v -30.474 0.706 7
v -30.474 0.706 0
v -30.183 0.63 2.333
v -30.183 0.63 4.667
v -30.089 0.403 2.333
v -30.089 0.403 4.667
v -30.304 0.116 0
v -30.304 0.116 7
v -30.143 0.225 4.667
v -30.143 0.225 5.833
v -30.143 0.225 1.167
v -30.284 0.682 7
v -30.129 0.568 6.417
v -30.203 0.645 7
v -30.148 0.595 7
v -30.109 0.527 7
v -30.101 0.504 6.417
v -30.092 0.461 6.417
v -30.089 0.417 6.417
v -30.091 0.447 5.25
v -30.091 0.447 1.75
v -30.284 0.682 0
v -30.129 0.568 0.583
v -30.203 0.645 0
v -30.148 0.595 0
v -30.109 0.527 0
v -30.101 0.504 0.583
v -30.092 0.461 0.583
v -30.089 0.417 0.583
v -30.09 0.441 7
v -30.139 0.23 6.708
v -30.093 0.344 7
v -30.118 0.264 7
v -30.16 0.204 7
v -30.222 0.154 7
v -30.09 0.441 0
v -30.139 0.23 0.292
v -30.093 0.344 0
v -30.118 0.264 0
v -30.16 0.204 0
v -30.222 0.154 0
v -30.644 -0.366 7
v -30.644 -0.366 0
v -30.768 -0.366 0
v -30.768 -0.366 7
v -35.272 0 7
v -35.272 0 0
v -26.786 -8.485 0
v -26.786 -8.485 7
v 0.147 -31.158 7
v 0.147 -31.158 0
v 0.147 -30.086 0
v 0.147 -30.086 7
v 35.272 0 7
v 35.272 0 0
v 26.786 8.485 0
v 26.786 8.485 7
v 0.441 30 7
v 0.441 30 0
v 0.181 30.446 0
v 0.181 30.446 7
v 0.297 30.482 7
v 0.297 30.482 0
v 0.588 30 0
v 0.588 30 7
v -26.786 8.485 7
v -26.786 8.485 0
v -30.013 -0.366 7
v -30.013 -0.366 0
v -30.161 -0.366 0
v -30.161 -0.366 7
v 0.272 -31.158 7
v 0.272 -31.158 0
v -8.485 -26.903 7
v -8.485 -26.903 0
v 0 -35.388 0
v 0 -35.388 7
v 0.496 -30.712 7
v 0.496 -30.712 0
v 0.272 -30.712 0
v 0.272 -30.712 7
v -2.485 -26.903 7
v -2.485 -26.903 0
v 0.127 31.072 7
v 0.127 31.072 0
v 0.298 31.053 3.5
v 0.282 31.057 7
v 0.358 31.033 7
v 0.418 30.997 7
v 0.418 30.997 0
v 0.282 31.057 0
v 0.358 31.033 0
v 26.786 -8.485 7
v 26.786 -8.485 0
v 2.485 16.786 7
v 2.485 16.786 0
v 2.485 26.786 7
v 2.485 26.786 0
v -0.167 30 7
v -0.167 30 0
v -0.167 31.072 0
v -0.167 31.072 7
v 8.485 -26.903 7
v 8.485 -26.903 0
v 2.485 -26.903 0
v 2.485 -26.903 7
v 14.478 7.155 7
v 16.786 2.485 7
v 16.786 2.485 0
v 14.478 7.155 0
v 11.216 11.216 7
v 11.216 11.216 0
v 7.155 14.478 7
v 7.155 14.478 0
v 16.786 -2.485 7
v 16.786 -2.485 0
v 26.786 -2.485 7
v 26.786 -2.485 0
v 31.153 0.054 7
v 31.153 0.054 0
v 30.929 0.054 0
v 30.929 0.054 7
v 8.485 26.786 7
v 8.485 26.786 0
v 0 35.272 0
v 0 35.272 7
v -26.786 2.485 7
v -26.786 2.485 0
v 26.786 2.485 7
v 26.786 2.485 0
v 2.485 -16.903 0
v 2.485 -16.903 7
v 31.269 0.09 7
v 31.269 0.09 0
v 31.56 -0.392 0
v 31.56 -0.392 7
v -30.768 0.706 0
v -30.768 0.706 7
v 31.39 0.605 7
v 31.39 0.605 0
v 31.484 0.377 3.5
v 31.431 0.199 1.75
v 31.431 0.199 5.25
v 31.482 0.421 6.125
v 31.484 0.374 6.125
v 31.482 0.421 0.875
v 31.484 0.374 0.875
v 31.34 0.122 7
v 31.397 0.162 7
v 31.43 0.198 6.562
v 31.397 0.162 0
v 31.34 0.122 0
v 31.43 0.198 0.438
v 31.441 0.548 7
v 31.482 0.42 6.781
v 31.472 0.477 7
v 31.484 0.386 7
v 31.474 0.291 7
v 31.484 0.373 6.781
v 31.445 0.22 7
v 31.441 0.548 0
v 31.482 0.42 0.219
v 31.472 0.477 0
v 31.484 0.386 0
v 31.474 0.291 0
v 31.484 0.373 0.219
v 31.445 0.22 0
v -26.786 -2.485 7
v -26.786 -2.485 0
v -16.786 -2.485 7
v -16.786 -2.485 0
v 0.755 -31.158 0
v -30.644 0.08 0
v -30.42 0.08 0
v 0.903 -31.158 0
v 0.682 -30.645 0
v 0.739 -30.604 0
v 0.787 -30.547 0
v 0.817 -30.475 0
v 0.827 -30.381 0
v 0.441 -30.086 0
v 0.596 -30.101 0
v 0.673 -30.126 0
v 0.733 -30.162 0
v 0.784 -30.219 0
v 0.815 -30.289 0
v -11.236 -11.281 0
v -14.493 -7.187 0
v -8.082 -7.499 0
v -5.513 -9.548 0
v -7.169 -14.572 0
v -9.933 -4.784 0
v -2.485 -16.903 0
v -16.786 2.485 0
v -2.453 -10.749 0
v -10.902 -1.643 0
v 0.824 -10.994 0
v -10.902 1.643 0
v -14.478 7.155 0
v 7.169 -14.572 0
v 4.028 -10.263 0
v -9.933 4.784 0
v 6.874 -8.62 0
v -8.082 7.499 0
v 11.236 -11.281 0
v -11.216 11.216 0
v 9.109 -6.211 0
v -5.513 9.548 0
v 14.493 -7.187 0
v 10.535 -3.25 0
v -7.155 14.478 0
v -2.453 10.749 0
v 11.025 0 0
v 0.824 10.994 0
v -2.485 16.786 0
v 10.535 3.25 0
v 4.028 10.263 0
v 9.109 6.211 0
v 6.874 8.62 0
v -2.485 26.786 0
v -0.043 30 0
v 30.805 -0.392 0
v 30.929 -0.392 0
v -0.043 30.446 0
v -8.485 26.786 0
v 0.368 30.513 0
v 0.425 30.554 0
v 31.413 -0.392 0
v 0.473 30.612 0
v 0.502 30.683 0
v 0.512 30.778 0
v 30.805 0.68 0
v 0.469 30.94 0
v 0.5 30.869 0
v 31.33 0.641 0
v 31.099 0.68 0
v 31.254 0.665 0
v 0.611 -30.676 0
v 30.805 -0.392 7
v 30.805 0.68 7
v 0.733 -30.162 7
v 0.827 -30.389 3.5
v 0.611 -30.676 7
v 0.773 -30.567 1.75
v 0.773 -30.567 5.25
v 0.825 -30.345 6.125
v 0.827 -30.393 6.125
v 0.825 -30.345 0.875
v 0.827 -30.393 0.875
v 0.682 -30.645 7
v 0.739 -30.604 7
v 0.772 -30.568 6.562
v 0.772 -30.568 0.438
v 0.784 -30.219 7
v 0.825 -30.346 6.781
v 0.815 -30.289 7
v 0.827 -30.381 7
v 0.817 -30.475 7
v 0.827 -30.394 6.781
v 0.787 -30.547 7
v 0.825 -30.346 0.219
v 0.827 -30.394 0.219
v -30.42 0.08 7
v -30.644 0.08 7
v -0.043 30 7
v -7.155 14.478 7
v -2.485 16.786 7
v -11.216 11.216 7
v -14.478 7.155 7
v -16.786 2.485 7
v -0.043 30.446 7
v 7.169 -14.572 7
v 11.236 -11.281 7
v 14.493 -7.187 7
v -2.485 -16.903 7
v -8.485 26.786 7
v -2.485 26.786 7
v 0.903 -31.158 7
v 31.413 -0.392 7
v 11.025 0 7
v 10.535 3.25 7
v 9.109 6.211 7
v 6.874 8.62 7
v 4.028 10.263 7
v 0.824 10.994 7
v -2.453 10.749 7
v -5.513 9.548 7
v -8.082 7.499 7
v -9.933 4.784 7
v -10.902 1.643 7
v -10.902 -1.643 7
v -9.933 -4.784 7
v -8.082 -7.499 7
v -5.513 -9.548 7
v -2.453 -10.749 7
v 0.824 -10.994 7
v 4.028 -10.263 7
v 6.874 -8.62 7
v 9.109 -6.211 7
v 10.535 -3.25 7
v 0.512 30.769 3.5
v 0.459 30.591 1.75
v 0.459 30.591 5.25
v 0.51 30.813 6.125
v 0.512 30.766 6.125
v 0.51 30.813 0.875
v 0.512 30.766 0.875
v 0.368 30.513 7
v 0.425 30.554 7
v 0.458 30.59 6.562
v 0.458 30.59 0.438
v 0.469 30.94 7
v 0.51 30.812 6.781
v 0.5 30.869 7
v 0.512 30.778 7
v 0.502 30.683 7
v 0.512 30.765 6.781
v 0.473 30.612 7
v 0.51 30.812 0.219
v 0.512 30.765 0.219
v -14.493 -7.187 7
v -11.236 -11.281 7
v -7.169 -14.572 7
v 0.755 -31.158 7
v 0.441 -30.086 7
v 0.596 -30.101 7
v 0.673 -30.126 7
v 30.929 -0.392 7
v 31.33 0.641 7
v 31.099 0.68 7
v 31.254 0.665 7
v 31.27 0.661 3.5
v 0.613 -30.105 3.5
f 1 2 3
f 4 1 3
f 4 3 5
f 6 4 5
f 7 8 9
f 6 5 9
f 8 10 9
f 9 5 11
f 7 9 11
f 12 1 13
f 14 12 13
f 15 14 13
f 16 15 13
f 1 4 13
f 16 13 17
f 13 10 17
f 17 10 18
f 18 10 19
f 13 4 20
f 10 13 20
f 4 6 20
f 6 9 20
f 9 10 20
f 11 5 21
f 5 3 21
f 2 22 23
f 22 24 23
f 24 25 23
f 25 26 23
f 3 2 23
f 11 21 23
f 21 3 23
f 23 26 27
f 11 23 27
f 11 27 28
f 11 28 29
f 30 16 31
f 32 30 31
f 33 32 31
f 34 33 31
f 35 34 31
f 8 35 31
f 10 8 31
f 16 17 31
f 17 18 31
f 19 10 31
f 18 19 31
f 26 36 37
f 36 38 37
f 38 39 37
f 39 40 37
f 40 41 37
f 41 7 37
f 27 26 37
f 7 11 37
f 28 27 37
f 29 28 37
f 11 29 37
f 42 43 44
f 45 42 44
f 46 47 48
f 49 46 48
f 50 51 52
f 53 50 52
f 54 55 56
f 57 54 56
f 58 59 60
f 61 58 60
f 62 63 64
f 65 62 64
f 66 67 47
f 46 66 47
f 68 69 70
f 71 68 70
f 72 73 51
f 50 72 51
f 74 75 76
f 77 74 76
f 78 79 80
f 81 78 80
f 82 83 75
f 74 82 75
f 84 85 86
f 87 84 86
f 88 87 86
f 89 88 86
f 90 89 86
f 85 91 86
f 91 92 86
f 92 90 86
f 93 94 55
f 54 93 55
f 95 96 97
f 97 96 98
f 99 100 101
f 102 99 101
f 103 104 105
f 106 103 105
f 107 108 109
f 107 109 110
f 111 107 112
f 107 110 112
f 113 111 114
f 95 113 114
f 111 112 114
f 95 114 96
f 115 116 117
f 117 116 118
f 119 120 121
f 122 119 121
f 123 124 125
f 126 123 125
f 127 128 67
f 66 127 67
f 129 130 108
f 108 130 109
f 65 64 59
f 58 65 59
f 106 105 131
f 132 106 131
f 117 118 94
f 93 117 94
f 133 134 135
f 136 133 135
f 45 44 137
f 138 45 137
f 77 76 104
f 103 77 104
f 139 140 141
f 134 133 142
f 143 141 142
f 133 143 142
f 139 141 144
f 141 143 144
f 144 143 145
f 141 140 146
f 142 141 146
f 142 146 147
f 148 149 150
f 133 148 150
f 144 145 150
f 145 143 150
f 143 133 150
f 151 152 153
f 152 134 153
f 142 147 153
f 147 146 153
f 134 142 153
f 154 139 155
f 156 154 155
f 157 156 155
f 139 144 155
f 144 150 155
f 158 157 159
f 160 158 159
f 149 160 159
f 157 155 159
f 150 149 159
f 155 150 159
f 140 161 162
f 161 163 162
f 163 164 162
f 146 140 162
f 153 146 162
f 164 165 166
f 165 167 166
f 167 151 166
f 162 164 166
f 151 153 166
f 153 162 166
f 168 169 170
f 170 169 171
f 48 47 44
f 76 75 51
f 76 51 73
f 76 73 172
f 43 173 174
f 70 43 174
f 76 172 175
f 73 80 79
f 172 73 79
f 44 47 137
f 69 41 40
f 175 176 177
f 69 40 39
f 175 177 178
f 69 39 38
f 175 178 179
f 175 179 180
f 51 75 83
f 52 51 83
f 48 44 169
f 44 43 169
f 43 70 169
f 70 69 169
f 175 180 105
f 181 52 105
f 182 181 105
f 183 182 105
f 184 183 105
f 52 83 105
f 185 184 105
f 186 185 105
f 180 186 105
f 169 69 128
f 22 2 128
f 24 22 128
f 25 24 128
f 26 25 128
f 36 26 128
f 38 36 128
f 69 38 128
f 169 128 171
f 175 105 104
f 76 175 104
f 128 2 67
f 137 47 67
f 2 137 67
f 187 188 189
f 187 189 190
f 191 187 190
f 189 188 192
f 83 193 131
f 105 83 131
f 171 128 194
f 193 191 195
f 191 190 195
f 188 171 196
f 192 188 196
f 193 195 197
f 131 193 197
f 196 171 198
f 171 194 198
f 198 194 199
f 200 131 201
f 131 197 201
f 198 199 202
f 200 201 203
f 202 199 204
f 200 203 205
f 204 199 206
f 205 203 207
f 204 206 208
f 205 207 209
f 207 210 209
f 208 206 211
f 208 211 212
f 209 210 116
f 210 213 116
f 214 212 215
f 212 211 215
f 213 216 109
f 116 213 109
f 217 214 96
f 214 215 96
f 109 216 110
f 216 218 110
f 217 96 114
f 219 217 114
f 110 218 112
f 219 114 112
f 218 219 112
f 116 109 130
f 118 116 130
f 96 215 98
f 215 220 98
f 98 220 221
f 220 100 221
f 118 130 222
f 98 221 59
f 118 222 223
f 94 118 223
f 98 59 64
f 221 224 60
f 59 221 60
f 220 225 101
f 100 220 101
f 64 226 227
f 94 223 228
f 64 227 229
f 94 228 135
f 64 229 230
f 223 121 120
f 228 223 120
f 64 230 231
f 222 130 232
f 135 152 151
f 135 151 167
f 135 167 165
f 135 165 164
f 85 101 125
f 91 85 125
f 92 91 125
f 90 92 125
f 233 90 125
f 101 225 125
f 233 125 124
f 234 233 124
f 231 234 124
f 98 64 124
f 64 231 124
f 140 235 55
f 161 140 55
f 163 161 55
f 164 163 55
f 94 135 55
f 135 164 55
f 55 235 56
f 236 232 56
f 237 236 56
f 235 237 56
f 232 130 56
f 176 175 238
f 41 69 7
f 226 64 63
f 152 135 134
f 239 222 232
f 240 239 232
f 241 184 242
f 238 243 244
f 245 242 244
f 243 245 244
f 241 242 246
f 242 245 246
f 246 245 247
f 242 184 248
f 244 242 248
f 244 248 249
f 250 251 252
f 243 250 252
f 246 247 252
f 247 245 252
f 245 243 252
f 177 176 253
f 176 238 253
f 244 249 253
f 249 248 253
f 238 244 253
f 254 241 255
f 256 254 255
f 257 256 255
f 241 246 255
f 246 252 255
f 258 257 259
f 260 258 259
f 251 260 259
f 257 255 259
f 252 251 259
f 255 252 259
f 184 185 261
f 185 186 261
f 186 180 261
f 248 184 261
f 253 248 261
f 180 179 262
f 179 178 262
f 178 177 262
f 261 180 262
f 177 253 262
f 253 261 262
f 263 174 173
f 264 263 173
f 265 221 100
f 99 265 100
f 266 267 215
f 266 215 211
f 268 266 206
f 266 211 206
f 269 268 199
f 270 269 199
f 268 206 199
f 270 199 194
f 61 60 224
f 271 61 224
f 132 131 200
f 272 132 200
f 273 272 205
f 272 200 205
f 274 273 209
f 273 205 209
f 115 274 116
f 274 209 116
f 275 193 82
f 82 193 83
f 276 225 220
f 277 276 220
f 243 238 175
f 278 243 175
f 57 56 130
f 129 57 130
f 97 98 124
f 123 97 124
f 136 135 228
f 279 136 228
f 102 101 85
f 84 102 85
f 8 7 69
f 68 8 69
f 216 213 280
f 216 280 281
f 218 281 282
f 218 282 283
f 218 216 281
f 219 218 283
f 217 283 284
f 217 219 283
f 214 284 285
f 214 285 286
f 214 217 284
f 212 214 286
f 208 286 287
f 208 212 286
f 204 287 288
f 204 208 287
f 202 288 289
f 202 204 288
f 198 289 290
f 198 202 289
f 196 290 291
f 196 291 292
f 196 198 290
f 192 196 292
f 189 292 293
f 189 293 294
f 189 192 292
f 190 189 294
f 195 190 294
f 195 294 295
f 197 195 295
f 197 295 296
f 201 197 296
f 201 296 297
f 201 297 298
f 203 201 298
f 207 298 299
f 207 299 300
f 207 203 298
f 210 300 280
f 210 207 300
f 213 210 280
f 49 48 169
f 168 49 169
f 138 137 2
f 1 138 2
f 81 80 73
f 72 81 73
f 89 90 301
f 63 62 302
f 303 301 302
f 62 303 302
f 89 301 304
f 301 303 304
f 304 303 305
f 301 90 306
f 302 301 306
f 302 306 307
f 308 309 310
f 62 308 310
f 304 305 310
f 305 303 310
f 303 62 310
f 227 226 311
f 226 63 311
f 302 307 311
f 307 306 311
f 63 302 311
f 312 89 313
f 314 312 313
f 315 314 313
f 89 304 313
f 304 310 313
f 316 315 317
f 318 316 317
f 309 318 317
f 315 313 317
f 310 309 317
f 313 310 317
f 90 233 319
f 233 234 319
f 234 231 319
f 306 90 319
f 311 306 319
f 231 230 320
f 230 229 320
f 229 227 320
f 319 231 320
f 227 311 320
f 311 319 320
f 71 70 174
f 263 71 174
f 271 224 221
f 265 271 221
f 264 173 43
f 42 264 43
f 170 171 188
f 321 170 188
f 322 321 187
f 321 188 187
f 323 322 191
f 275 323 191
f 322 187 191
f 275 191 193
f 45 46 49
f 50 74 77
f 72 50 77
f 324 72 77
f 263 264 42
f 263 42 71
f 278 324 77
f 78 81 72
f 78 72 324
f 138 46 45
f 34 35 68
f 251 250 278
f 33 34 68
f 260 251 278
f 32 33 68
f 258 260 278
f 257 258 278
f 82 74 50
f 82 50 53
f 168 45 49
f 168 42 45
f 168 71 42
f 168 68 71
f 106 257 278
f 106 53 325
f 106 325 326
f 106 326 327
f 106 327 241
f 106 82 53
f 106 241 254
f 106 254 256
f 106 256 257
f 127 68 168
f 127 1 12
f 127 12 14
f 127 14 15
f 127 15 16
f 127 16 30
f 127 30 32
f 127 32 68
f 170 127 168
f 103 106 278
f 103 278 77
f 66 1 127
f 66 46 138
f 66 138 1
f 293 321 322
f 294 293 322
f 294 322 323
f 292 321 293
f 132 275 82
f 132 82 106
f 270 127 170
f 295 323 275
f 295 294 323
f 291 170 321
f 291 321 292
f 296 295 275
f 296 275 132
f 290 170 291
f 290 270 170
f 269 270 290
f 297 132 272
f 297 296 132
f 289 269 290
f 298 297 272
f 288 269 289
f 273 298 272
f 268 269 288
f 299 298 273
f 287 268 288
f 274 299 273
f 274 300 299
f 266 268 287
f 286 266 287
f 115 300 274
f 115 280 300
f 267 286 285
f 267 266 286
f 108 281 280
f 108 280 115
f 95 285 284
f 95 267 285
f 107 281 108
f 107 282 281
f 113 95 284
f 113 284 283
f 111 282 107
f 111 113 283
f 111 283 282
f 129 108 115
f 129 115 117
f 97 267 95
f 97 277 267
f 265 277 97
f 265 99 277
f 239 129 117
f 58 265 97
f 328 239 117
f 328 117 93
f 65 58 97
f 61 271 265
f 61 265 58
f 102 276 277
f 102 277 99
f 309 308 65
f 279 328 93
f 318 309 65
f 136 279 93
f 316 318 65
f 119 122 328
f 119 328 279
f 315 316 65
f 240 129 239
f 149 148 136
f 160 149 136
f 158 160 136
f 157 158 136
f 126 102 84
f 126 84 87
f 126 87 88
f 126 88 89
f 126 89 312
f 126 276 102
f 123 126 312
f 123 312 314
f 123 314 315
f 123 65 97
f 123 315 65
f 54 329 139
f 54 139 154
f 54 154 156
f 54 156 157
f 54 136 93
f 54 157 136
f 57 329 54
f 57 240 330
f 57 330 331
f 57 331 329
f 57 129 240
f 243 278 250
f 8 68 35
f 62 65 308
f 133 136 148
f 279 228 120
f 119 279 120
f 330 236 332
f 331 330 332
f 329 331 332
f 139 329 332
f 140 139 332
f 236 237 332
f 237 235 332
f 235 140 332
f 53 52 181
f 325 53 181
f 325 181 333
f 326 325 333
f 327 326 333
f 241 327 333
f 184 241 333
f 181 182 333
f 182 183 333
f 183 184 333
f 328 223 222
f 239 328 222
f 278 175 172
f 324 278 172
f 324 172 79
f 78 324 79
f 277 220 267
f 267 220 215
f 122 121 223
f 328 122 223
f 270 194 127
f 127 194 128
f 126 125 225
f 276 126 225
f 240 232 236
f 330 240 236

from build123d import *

# Parameters (mm, degrees)
F0_R     = 11.025
F1_DEPTH = 7


with BuildPart() as f1:
    # F0 (on Top) → F1 (new body)
    with BuildSketch(Plane.XY):
        with BuildLine():
            Line((8.4852813742, 26.7863036134), (0, 35.2715849876))
            Line((0, 35.2715849876), (-8.4852813742, 26.7863036134))
            Line((-8.4852813742, 26.7863036134), (-2.4852813742, 26.7863036134))
            Line((-2.4852813742, 26.7863036134), (-2.4852813742, 16.7863036134))
            ThreePointArc((-2.4852813742, 16.7863036134), (-11.2157675105, 11.2157675105), (-16.7863036134, 2.4852813742))
            Line((-16.7863036134, 2.4852813742), (-26.7863036134, 2.4852813742))
            Line((-26.7863036134, 2.4852813742), (-26.7863036134, 8.4852813742))
            Line((-26.7863036134, 8.4852813742), (-35.2715849876, 0))
            Line((-35.2715849876, 0), (-26.7863036134, -8.4852813742))
            Line((-26.7863036134, -8.4852813742), (-26.7863036134, -2.4852813742))
            Line((-26.7863036134, -2.4852813742), (-16.7863036134, -2.4852813742))
            ThreePointArc((-16.7863036134, -2.4852813742), (-11.2357756094, -11.2810159865), (-2.4852813742, -16.9025957584))
            Line((-2.4852813742, -16.9025957584), (-2.4852813742, -26.9025957584))
            Line((-2.4852813742, -26.9025957584), (-8.4852813742, -26.9025957584))
            Line((-8.4852813742, -26.9025957584), (0, -35.3878771327))
            Line((0, -35.3878771327), (8.4852813742, -26.9025957584))
            Line((8.4852813742, -26.9025957584), (2.4852813742, -26.9025957584))
            Line((2.4852813742, -26.9025957584), (2.4852813742, -16.9025957584))
            ThreePointArc((2.4852813742, -16.9025957584), (11.2357756094, -11.2810159865), (16.7863036134, -2.4852813742))
            Line((16.7863036134, -2.4852813742), (26.7863036134, -2.4852813742))
            Line((26.7863036134, -2.4852813742), (26.7863036134, -8.4852813742))
            Line((26.7863036134, -8.4852813742), (35.2715849876, 0))
            Line((35.2715849876, 0), (26.7863036134, 8.4852813742))
            Line((26.7863036134, 8.4852813742), (26.7863036134, 2.4852813742))
            Line((26.7863036134, 2.4852813742), (16.7863036134, 2.4852813742))
            ThreePointArc((16.7863036134, 2.4852813742), (11.2157675105, 11.2157675105), (2.4852813742, 16.7863036134))
            Line((2.4852813742, 16.7863036134), (2.4852813742, 26.7863036134))
            Line((2.4852813742, 26.7863036134), (8.4852813742, 26.7863036134))
        make_face()
        with BuildLine():
            Line((0.4957766307, -30.7123869197), (0.2719380573, -30.7123869197))
            Line((0.2719380573, -30.7123869197), (0.2719380573, -31.1581870135))
            Line((0.2719380573, -31.1581870135), (0.1473486626, -31.1581870135))
            Line((0.1473486626, -31.1581870135), (0.1473486626, -30.0861551036))
            Line((0.1473486626, -30.0861551036), (0.4413420929, -30.0861551036))
            add(Edge.make_bspline(
                [(0.4413420929, -30.0861551036), (0.6386672924, -30.0861551036), (0.7328718911, -30.161706488)],
                knots=[0, 0, 0, 1, 1, 1], degree=2))
            add(Edge.make_bspline(
                [(0.7328718911, -30.161706488), (0.8270764899, -30.2372578723), (0.8270764899, -30.3890645358)],
                knots=[0, 0, 0, 1, 1, 1], degree=2))
            add(Edge.make_bspline(
                [(0.8270764899, -30.3890645358), (0.8270764899, -30.6016407911), (0.6114500235, -30.6764882805)],
                knots=[0, 0, 0, 1, 1, 1], degree=2))
            Line((0.6114500235, -30.6764882805), (0.9026278742, -31.1581870135))
            Line((0.9026278742, -31.1581870135), (0.7552792116, -31.1581870135))
            Line((0.7552792116, -31.1581870135), (0.4957766307, -30.7123869197))
        make_face(mode=Mode.SUBTRACT)
        with BuildLine():
            Line((-30.4200164008, 0.0797443089), (-30.6438549742, 0.0797443089))
            Line((-30.6438549742, 0.0797443089), (-30.6438549742, -0.366055785))
            Line((-30.6438549742, -0.366055785), (-30.7684443689, -0.366055785))
            Line((-30.7684443689, -0.366055785), (-30.7684443689, 0.7059761249))
            Line((-30.7684443689, 0.7059761249), (-30.4744509385, 0.7059761249))
            add(Edge.make_bspline(
                [(-30.4744509385, 0.7059761249), (-30.2771257391, 0.7059761249), (-30.1829211403, 0.6304247406)],
                knots=[0, 0, 0, 1, 1, 1], degree=2))
            add(Edge.make_bspline(
                [(-30.1829211403, 0.6304247406), (-30.0887165415, 0.5548733563), (-30.0887165415, 0.4030666927)],
                knots=[0, 0, 0, 1, 1, 1], degree=2))
            add(Edge.make_bspline(
                [(-30.0887165415, 0.4030666927), (-30.0887165415, 0.1904904375), (-30.304343008, 0.115642948)],
                knots=[0, 0, 0, 1, 1, 1], degree=2))
            Line((-30.304343008, 0.115642948), (-30.0131651572, -0.366055785))
            Line((-30.0131651572, -0.366055785), (-30.1605138198, -0.366055785))
            Line((-30.1605138198, -0.366055785), (-30.4200164008, 0.0797443089))
        make_face(mode=Mode.SUBTRACT)
        Circle(F0_R, mode=Mode.SUBTRACT)
        with BuildLine():
            Line((31.1531984282, 0.0540223872), (30.9293598548, 0.0540223872))
            Line((30.9293598548, 0.0540223872), (30.9293598548, -0.3917777067))
            Line((30.9293598548, -0.3917777067), (30.8047704601, -0.3917777067))
            Line((30.8047704601, -0.3917777067), (30.8047704601, 0.6802542032))
            Line((30.8047704601, 0.6802542032), (31.0987638904, 0.6802542032))
            add(Edge.make_bspline(
                [(31.0987638904, 0.6802542032), (31.2960890899, 0.6802542032), (31.3902936886, 0.6047028189)],
                knots=[0, 0, 0, 1, 1, 1], degree=2))
            add(Edge.make_bspline(
                [(31.3902936886, 0.6047028189), (31.4844982874, 0.5291514346), (31.4844982874, 0.377344771)],
                knots=[0, 0, 0, 1, 1, 1], degree=2))
            add(Edge.make_bspline(
                [(31.4844982874, 0.377344771), (31.4844982874, 0.1647685158), (31.268871821, 0.0899210263)],
                knots=[0, 0, 0, 1, 1, 1], degree=2))
            Line((31.268871821, 0.0899210263), (31.5600496718, -0.3917777067))
            Line((31.5600496718, -0.3917777067), (31.4127010092, -0.3917777067))
            Line((31.4127010092, -0.3917777067), (31.1531984282, 0.0540223872))
        make_face(mode=Mode.SUBTRACT)
        with BuildLine():
            Line((0.1811846398, 30.4459987263), (-0.0426539337, 30.4459987263))
            Line((-0.0426539337, 30.4459987263), (-0.0426539337, 30.0001986325))
            Line((-0.0426539337, 30.0001986325), (-0.1672433283, 30.0001986325))
            Line((-0.1672433283, 30.0001986325), (-0.1672433283, 31.0722305424))
            Line((-0.1672433283, 31.0722305424), (0.126750102, 31.0722305424))
            add(Edge.make_bspline(
                [(0.126750102, 31.0722305424), (0.3240753015, 31.0722305424), (0.4182799002, 30.9966791581)],
                knots=[0, 0, 0, 1, 1, 1], degree=2))
            add(Edge.make_bspline(
                [(0.4182799002, 30.9966791581), (0.512484499, 30.9211277737), (0.512484499, 30.7693211102)],
                knots=[0, 0, 0, 1, 1, 1], degree=2))
            add(Edge.make_bspline(
                [(0.512484499, 30.7693211102), (0.512484499, 30.5567448549), (0.2968580326, 30.4818973655)],
                knots=[0, 0, 0, 1, 1, 1], degree=2))
            Line((0.2968580326, 30.4818973655), (0.5880358833, 30.0001986325))
            Line((0.5880358833, 30.0001986325), (0.4406872207, 30.0001986325))
            Line((0.4406872207, 30.0001986325), (0.1811846398, 30.4459987263))
        make_face(mode=Mode.SUBTRACT)
    extrude(amount=F1_DEPTH)


solid = f1.part
